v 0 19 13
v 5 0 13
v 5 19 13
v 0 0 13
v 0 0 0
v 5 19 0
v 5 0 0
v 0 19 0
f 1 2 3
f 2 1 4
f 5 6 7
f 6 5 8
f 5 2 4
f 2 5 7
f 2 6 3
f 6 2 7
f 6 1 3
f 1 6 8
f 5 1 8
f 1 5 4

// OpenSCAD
// Generated by SolidPython 1.0.1 on 2020-07-29 00:46:54


cube(size = [5, 19, 13]);
/***********************************************
*********      SolidPython code:      **********
************************************************
 
# import packages: SolidPython
from solid import *
from solid.utils import *
from itertools import chain, combinations, permutations


class Resize:

    def __init__(self, scad_file):
        self.scad_file = scad_file
        #self.scad_file = import_scad(scad_file)
        # cone/cylinder param:
        self.r1 = 0
        self.r2 = 0
        self.h = 0
        # rectangular prism param:
        self.w = 0
        self.l = 0
        # ellipse param:
        self.r = 0

    # import OpenScad code (file name corresponds to shape)


    # classify shape + parameters
    def assign(self, param1, param2, param3):
        if self.scad_file == 'cone.scad':
            self.r1 = param1
            self.r2 = param2
            self.h = param3
        elif self.scad_file == 'cylinder.scad':
            self.r1 = param1
            self.r2 = param2
            self.h = param3
        elif self.scad_file == 'rectangularPrism.scad':
            self.h = param1
            self.l = param2
            self.w = param3
        else:
            self.r = param1
            self.h = param2

    # resize parameters
    def iterate(self):
        x = range(3, 20, 2)
        i = 1
        if self.scad_file == 'cone.scad':
            tempList = list(permutations(x, 2))
            for temp in tempList:
                param1 = temp[0]
                param2 = temp[1]
                filepath = 'produced_scad_files/' + 'cone' + str(param1) + '_' + str(param2) + '_' + '.scad'
                scad_render_to_file(cylinder(h=param1, r1=param2, r2=0), filepath)

        elif self.scad_file == 'cylinder.scad':
            tempList = list(permutations(x, 3))
            for temp in tempList:
                param1 = temp[0]
                param2 = temp[1]
                filepath = 'produced_scad_files/' + 'cylinder' + str(param1) + '_' + str(param2) + '_' + '.scad'
                scad_render_to_file(cylinder(h=param1, r1=param2, r2=param2), filepath)

        elif self.scad_file == 'rectangularPrism.scad':
            tempList = list(permutations(x, 3))
            for temp in tempList:
                param1 = temp[0]
                param2 = temp[1]
                param3 = temp[2]
                filepath = 'produced_scad_files/' + 'rectangularPrism' + str(param1) + '_' + str(param2) + '_' + str(
                    param3) + '.scad'
                scad_render_to_file(cube(size=(param1, param2, param3)), filepath)

        elif self.scad_file == 'ellipse.scad':
            tempList = list(permutations(x, 4))
            for temp in tempList:
                param1 = temp[0]
                param2 = temp[1]
                param3 = temp[2]
                param4 = temp[3]
                filepath = 'produced_scad_files/' + 'ellipse' + str(param1) + '_' + str(param2) + '_' + str(param3) + '_' + str(param4) + '.scad'
                scad_render_to_file(scale([param1, param2, param3])(sphere(r=param4)), filepath)

    def render_to_scadfile(self):
        scad_render_to_file(scad, 'example.scad') 
 
************************************************/
